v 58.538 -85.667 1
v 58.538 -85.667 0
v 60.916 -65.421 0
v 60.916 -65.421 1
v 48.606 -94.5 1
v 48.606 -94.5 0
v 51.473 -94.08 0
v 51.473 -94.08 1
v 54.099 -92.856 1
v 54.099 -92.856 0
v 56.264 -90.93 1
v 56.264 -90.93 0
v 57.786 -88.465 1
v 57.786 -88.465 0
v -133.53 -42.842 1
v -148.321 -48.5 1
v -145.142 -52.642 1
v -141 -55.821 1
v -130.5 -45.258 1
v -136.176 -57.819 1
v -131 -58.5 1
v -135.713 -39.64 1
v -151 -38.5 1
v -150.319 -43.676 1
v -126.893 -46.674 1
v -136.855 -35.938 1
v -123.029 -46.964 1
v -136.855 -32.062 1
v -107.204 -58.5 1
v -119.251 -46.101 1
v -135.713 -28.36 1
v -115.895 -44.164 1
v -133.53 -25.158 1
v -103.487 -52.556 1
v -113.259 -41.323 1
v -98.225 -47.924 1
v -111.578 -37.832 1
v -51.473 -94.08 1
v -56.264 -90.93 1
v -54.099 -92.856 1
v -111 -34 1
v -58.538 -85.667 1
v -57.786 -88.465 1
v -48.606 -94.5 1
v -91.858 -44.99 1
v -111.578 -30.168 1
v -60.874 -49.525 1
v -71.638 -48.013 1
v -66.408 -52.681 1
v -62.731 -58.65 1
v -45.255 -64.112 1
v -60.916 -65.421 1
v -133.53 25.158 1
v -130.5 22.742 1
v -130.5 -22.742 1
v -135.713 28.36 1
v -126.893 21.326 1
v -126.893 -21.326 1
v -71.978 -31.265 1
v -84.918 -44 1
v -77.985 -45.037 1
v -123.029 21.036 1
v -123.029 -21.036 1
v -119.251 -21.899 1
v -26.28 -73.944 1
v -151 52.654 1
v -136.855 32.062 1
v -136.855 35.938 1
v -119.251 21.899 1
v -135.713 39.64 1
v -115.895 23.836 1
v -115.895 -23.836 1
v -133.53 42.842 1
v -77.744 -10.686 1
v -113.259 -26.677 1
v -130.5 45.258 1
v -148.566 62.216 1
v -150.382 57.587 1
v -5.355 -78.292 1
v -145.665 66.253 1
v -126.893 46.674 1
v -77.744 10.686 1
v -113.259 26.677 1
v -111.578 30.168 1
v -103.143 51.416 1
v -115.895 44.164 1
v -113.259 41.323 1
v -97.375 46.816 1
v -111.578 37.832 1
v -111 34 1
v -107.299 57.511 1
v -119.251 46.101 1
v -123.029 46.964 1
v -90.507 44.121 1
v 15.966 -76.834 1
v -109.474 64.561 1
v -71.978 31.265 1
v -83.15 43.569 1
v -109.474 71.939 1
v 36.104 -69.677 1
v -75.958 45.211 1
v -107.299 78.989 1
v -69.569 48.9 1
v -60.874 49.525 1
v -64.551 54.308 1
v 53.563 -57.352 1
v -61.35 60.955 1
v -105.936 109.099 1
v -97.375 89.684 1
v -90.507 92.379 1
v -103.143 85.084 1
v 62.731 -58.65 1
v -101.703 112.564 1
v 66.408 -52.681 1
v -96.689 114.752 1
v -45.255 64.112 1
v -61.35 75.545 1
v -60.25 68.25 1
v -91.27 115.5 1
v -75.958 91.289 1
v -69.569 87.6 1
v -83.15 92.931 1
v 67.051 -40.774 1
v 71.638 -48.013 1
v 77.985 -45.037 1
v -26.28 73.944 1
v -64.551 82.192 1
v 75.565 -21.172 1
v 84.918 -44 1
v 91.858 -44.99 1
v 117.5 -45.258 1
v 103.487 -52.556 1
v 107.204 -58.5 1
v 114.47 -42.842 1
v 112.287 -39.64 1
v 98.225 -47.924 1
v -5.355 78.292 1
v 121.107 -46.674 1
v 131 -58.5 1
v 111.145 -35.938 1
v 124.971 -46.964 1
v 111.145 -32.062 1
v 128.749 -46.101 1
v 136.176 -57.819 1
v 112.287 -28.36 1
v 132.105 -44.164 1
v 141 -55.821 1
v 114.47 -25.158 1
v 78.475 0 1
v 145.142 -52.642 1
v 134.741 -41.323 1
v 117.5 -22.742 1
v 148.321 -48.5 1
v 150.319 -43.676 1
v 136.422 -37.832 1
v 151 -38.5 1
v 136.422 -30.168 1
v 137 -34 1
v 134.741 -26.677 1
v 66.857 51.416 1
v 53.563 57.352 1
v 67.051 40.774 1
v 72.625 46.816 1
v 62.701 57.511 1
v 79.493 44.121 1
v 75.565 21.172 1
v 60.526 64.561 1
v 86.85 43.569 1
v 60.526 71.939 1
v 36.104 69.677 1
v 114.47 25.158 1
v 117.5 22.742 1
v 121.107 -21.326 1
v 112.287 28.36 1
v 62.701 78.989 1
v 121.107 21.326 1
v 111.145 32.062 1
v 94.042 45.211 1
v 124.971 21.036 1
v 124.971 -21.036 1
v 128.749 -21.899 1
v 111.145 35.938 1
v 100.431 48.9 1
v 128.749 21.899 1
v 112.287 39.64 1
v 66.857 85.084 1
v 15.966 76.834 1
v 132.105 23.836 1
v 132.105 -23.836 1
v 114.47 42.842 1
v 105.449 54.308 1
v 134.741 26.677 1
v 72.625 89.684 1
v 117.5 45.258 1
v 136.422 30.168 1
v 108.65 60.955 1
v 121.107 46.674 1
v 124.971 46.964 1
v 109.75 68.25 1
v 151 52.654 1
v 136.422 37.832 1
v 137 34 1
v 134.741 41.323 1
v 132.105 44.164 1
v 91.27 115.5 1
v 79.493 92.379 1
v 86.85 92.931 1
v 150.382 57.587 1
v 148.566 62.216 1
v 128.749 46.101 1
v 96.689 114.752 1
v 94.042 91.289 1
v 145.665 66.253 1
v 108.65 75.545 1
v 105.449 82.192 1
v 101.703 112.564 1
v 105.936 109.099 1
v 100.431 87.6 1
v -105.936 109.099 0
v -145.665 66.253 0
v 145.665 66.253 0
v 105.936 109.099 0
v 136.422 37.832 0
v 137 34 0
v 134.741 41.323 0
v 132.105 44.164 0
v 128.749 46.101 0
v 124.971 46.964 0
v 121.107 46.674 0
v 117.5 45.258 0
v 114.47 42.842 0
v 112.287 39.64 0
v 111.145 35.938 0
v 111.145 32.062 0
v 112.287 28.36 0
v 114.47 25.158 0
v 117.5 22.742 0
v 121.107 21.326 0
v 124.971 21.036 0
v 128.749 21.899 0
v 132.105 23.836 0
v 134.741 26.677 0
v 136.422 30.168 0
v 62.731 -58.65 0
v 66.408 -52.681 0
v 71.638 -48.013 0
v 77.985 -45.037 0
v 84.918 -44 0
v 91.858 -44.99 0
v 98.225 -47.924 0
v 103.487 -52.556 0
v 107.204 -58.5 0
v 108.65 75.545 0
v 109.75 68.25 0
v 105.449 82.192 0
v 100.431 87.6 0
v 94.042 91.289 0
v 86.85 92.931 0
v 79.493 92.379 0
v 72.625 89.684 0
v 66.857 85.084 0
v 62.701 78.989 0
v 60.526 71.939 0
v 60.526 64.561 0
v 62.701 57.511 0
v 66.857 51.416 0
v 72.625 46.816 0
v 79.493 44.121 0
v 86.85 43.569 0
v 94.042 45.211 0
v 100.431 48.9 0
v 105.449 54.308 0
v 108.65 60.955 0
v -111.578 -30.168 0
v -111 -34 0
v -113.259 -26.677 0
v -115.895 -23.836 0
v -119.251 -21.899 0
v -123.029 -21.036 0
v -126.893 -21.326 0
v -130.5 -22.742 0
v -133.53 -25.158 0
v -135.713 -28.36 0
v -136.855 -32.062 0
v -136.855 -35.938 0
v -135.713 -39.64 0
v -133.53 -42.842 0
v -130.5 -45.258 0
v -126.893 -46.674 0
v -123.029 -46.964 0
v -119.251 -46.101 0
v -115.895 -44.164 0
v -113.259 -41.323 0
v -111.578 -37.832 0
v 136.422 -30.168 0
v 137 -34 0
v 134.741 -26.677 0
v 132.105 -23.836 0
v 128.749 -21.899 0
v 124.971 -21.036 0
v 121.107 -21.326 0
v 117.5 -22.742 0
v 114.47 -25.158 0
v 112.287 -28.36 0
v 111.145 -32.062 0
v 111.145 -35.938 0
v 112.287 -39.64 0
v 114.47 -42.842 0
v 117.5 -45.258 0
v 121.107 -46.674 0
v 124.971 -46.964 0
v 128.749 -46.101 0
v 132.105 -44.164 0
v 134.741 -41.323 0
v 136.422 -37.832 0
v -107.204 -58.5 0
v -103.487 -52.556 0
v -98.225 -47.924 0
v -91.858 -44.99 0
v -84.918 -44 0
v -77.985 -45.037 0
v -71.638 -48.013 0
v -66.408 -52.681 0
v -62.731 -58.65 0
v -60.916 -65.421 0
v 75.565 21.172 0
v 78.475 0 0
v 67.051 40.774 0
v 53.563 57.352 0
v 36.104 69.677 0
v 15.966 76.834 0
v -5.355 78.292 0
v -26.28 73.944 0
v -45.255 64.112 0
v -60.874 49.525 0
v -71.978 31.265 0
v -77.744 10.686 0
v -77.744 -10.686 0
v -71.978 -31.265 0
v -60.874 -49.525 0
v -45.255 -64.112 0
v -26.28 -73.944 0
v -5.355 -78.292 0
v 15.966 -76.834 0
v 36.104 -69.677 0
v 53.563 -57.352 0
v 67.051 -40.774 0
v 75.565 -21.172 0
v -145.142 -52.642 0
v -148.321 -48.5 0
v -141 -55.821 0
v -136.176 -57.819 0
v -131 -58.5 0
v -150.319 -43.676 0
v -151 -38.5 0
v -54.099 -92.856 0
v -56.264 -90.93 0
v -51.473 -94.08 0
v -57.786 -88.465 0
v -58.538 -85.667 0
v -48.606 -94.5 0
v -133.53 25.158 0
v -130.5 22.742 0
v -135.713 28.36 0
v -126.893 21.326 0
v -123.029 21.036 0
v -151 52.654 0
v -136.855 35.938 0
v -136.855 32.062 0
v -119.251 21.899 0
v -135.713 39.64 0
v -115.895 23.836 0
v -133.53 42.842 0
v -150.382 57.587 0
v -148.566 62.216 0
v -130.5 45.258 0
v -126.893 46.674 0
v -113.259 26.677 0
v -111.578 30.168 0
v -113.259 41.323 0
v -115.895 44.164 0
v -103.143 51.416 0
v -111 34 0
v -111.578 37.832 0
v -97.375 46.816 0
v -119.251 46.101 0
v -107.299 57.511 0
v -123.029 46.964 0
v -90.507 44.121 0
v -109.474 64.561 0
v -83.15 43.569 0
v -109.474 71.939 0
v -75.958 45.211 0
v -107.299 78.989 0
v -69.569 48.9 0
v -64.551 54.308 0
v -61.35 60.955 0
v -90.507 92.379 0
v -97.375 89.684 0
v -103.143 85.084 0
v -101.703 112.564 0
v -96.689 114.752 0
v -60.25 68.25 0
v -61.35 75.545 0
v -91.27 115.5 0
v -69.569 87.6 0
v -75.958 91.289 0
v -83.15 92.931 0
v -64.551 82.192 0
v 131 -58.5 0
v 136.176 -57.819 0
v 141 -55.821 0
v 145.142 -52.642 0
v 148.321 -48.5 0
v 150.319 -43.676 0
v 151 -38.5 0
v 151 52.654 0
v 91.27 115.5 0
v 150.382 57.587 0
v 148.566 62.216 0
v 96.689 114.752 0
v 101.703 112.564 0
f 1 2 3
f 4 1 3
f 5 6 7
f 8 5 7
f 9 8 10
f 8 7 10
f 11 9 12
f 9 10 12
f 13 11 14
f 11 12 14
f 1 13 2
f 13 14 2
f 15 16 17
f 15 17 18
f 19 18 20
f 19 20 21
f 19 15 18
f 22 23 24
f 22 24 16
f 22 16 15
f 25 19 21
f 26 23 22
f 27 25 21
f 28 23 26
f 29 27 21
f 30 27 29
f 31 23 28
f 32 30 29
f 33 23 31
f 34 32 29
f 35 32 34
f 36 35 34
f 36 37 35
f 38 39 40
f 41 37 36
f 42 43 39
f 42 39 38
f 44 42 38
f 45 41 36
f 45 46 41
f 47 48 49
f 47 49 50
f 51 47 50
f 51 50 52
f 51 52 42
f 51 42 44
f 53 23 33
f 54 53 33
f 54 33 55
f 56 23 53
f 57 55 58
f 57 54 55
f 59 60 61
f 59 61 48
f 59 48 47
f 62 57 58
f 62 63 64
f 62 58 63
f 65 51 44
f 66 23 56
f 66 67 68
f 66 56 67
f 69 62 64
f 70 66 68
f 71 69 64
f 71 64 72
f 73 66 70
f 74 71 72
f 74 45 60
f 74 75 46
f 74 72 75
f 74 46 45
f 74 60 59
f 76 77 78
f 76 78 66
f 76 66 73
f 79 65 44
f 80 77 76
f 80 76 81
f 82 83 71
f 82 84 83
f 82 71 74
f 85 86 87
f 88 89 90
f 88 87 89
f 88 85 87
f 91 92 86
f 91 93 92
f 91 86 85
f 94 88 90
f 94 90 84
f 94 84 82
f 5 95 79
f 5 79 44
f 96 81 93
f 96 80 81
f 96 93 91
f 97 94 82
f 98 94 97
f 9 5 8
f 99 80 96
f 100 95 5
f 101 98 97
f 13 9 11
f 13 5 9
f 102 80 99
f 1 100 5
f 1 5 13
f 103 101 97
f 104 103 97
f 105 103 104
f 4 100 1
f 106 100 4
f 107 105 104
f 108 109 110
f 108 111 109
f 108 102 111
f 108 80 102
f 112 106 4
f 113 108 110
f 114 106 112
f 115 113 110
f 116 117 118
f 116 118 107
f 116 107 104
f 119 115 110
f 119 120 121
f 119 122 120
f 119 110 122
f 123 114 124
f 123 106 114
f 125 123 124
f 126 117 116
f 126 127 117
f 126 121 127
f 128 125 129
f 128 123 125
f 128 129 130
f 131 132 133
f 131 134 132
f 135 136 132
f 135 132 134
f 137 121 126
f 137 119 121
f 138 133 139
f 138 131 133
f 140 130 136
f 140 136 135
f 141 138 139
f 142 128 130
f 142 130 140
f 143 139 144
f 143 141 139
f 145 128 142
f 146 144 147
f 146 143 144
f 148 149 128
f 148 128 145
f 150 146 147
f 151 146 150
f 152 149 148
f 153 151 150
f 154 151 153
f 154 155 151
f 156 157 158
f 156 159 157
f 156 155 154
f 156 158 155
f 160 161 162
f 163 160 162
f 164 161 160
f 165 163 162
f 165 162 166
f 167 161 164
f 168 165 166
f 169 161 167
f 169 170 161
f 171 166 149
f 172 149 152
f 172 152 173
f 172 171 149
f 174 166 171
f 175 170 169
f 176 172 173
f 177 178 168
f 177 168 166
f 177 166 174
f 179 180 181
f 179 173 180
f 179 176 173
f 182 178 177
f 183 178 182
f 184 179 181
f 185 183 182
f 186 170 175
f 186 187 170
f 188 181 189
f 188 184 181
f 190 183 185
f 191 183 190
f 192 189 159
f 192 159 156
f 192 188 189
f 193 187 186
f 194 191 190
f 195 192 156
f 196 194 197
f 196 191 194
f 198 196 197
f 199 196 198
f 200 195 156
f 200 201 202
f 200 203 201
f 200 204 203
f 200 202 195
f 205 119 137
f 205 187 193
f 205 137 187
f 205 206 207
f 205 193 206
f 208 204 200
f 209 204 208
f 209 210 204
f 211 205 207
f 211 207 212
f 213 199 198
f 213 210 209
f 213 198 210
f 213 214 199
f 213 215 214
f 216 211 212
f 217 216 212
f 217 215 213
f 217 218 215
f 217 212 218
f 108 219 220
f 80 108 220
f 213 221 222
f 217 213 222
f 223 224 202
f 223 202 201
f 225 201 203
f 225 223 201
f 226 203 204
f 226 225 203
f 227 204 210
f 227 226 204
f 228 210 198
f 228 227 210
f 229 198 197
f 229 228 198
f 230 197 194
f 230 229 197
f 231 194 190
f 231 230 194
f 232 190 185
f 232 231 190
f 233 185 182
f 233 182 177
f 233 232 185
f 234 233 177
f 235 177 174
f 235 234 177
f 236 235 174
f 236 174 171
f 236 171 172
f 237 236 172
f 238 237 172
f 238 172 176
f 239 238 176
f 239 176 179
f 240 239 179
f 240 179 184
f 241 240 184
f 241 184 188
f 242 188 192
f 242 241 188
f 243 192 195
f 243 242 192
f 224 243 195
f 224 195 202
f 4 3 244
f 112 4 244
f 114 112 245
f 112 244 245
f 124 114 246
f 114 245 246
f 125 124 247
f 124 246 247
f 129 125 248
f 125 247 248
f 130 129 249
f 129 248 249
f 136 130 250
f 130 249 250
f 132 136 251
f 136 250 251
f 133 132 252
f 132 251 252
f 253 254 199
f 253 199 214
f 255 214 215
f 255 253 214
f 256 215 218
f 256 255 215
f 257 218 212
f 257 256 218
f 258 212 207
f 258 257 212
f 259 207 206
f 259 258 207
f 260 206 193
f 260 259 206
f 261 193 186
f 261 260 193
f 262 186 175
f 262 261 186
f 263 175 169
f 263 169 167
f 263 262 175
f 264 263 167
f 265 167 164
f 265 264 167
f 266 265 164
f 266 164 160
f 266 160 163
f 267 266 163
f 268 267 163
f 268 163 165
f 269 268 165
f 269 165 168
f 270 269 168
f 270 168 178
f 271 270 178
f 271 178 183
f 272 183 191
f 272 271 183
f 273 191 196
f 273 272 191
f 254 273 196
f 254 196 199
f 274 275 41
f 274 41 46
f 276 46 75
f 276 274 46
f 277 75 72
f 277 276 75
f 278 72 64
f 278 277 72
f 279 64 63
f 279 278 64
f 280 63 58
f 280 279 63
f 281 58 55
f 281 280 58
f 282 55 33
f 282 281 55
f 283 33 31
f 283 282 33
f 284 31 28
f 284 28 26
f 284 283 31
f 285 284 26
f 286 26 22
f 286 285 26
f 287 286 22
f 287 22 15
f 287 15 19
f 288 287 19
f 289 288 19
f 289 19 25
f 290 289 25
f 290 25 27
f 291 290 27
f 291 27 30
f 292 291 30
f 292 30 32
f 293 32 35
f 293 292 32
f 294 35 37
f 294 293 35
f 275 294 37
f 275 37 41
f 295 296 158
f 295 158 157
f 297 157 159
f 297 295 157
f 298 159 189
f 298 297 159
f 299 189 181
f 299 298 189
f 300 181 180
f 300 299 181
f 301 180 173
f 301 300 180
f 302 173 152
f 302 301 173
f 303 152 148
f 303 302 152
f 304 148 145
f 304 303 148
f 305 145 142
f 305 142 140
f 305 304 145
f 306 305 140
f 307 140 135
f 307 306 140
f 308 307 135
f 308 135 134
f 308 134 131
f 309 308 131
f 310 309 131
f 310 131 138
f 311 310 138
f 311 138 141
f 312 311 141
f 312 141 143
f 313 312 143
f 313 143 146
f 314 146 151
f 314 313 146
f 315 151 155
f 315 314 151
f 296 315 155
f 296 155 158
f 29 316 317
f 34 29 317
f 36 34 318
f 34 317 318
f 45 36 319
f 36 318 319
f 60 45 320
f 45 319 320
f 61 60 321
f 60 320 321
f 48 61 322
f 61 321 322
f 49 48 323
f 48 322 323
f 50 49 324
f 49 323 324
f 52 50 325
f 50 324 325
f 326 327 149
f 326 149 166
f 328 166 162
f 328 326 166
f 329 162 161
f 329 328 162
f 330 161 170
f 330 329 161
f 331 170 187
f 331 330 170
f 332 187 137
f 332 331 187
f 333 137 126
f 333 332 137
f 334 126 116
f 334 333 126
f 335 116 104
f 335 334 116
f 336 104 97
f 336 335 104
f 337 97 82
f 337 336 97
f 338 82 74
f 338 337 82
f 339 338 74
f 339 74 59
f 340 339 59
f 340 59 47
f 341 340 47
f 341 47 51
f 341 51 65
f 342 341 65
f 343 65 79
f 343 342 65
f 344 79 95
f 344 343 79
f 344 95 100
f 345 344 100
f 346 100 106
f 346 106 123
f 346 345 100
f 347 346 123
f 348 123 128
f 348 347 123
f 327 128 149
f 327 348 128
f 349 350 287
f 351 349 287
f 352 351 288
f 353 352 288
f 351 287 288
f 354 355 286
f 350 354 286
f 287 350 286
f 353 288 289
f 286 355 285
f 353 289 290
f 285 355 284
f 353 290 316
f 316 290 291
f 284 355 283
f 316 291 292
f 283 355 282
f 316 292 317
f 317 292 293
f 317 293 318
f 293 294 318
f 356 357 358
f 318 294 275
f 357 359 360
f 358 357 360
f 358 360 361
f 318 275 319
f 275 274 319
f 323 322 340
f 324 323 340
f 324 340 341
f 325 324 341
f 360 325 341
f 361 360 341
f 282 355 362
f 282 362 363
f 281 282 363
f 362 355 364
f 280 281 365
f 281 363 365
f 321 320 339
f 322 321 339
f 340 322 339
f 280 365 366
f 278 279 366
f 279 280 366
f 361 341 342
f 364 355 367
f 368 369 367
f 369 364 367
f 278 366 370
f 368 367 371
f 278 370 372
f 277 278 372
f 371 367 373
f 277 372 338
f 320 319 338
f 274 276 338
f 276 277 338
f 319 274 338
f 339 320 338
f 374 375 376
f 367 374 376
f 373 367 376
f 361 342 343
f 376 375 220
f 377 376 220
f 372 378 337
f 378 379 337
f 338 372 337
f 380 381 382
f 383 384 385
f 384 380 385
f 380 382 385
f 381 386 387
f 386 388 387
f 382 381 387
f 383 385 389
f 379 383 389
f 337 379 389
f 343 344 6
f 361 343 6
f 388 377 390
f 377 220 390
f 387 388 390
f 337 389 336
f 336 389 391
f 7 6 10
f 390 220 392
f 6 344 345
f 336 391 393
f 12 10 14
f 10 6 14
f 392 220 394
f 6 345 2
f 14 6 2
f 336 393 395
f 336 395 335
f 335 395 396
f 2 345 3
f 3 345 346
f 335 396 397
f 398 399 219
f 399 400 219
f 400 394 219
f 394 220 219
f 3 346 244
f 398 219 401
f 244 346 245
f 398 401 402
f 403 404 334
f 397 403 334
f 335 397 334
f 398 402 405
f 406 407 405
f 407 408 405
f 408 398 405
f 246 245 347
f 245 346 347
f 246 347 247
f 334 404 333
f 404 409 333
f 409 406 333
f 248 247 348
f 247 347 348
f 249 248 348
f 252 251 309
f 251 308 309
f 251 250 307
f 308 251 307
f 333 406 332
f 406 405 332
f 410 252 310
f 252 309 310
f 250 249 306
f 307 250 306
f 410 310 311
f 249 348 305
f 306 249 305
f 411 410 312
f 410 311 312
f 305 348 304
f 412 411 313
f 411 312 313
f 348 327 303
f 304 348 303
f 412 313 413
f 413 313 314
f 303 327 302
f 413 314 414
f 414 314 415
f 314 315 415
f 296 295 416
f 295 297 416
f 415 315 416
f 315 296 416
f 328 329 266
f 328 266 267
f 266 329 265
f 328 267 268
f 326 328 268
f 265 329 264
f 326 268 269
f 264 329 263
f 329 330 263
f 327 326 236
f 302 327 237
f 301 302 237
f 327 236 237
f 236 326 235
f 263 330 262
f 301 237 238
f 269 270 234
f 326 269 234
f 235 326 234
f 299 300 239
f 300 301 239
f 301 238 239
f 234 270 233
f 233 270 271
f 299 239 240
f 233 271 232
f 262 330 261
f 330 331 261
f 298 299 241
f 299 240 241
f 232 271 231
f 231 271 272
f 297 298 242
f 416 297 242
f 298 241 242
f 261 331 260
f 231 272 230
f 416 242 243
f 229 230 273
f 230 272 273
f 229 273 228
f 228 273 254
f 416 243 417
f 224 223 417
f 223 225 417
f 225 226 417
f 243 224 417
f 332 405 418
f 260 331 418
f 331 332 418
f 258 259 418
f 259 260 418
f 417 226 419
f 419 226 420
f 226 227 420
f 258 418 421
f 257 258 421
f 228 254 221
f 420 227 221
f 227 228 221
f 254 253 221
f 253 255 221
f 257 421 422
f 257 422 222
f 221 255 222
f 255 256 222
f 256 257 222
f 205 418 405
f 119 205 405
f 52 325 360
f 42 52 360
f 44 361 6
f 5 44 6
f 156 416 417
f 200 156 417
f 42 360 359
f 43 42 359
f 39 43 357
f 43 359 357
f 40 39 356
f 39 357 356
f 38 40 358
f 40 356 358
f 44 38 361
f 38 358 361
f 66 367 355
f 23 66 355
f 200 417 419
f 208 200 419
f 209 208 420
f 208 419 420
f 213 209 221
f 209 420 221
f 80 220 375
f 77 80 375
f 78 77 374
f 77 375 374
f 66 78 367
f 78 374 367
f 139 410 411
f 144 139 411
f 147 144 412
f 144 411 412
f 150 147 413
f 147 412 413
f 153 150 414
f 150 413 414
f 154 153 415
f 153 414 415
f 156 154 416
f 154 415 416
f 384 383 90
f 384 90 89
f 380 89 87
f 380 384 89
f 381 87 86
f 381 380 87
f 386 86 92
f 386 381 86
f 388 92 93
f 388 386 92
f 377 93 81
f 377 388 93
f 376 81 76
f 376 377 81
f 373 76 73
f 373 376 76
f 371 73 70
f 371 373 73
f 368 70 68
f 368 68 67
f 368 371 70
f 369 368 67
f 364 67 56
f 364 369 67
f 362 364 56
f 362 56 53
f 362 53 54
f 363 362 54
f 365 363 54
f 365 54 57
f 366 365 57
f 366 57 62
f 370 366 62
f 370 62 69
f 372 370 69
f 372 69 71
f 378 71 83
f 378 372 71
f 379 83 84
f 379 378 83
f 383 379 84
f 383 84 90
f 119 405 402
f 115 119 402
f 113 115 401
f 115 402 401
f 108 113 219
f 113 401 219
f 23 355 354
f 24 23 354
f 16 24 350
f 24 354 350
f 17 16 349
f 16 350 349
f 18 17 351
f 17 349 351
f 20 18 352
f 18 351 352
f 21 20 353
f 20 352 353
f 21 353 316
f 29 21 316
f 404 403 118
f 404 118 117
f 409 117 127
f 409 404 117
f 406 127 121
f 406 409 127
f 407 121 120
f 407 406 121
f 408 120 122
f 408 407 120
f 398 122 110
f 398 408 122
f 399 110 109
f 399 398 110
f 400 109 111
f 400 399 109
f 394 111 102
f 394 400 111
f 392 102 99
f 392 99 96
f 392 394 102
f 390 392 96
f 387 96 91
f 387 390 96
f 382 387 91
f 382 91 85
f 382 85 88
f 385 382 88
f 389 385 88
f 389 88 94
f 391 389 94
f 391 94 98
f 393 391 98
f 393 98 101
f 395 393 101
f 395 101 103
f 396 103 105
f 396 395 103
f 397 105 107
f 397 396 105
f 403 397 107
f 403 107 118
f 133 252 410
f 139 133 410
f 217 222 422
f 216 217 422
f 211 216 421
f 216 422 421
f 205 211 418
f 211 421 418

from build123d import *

# Parameters (mm, degrees)
SKETCH1_R           = 24.75
SKETCH1_R_2         = 13
SKETCH1_R_3         = 78.475
BOSS_EXTRUDE1_DEPTH = 1


with BuildPart() as part:
    # Sketch1 → Boss-Extrude1 (new body)
    with BuildSketch(Plane.XY):
        with BuildLine():
            Line((-2.561737691, 115.5), (-91.270303138, 115.5))
            ThreePointArc((-91.270303138, 115.5), (-99.271058557, 113.829973069), (-105.935666275, 109.098791272))
            Line((-105.935666275, 109.098791272), (-145.665363137, 66.253039754))
            ThreePointArc((-145.665363137, 66.253039754), (-149.618636668, 59.958108327), (-151, 52.654248482))
            Line((-151, 52.654248482), (-151, -38.5))
            ThreePointArc((-151, -38.5), (-145.142135624, -52.642135624), (-131, -58.5))
            Line((-131, -58.5), (-107.203603311, -58.5))
            ThreePointArc((-107.203603311, -58.5), (-81.413958175, -44.266614), (-60.915571747, -65.421075164))
            Line((-60.915571747, -65.421075164), (-58.537563271, -85.666566943))
            ThreePointArc((-58.537563271, -85.666566943), (-55.251678473, -91.972137225), (-48.60584028, -94.5))
            Line((-48.60584028, -94.5), (48.60584028, -94.5))
            ThreePointArc((48.60584028, -94.5), (55.251678473, -91.972137225), (58.537563271, -85.666566943))
            Line((58.537563271, -85.666566943), (60.915571747, -65.421075164))
            ThreePointArc((60.915571747, -65.421075164), (81.413958175, -44.266614), (107.203603311, -58.5))
            Line((107.203603311, -58.5), (131, -58.5))
            ThreePointArc((131, -58.5), (145.142135624, -52.642135624), (151, -38.5))
            Line((151, -38.5), (151, 52.654248482))
            ThreePointArc((151, 52.654248482), (149.618636668, 59.958108327), (145.665363137, 66.253039754))
            Line((145.665363137, 66.253039754), (105.935666275, 109.098791272))
            ThreePointArc((105.935666275, 109.098791272), (99.271058557, 113.829973069), (91.270303138, 115.5))
            Line((91.270303138, 115.5), (-2.561737691, 115.5))
        make_face()
        with Locations((-85, 68.25)):
            Circle(SKETCH1_R, mode=Mode.SUBTRACT)
        with Locations((85, 68.25)):
            Circle(SKETCH1_R, mode=Mode.SUBTRACT)
        with Locations((124, -34)):
            Circle(SKETCH1_R_2, mode=Mode.SUBTRACT)
        with Locations((124, 34)):
            Circle(SKETCH1_R_2, mode=Mode.SUBTRACT)
        with Locations((-124, 34)):
            Circle(SKETCH1_R_2, mode=Mode.SUBTRACT)
        with Locations((-124, -34)):
            Circle(SKETCH1_R_2, mode=Mode.SUBTRACT)
        Circle(SKETCH1_R_3, mode=Mode.SUBTRACT)
    extrude(amount=BOSS_EXTRUDE1_DEPTH)


solid = part.part
